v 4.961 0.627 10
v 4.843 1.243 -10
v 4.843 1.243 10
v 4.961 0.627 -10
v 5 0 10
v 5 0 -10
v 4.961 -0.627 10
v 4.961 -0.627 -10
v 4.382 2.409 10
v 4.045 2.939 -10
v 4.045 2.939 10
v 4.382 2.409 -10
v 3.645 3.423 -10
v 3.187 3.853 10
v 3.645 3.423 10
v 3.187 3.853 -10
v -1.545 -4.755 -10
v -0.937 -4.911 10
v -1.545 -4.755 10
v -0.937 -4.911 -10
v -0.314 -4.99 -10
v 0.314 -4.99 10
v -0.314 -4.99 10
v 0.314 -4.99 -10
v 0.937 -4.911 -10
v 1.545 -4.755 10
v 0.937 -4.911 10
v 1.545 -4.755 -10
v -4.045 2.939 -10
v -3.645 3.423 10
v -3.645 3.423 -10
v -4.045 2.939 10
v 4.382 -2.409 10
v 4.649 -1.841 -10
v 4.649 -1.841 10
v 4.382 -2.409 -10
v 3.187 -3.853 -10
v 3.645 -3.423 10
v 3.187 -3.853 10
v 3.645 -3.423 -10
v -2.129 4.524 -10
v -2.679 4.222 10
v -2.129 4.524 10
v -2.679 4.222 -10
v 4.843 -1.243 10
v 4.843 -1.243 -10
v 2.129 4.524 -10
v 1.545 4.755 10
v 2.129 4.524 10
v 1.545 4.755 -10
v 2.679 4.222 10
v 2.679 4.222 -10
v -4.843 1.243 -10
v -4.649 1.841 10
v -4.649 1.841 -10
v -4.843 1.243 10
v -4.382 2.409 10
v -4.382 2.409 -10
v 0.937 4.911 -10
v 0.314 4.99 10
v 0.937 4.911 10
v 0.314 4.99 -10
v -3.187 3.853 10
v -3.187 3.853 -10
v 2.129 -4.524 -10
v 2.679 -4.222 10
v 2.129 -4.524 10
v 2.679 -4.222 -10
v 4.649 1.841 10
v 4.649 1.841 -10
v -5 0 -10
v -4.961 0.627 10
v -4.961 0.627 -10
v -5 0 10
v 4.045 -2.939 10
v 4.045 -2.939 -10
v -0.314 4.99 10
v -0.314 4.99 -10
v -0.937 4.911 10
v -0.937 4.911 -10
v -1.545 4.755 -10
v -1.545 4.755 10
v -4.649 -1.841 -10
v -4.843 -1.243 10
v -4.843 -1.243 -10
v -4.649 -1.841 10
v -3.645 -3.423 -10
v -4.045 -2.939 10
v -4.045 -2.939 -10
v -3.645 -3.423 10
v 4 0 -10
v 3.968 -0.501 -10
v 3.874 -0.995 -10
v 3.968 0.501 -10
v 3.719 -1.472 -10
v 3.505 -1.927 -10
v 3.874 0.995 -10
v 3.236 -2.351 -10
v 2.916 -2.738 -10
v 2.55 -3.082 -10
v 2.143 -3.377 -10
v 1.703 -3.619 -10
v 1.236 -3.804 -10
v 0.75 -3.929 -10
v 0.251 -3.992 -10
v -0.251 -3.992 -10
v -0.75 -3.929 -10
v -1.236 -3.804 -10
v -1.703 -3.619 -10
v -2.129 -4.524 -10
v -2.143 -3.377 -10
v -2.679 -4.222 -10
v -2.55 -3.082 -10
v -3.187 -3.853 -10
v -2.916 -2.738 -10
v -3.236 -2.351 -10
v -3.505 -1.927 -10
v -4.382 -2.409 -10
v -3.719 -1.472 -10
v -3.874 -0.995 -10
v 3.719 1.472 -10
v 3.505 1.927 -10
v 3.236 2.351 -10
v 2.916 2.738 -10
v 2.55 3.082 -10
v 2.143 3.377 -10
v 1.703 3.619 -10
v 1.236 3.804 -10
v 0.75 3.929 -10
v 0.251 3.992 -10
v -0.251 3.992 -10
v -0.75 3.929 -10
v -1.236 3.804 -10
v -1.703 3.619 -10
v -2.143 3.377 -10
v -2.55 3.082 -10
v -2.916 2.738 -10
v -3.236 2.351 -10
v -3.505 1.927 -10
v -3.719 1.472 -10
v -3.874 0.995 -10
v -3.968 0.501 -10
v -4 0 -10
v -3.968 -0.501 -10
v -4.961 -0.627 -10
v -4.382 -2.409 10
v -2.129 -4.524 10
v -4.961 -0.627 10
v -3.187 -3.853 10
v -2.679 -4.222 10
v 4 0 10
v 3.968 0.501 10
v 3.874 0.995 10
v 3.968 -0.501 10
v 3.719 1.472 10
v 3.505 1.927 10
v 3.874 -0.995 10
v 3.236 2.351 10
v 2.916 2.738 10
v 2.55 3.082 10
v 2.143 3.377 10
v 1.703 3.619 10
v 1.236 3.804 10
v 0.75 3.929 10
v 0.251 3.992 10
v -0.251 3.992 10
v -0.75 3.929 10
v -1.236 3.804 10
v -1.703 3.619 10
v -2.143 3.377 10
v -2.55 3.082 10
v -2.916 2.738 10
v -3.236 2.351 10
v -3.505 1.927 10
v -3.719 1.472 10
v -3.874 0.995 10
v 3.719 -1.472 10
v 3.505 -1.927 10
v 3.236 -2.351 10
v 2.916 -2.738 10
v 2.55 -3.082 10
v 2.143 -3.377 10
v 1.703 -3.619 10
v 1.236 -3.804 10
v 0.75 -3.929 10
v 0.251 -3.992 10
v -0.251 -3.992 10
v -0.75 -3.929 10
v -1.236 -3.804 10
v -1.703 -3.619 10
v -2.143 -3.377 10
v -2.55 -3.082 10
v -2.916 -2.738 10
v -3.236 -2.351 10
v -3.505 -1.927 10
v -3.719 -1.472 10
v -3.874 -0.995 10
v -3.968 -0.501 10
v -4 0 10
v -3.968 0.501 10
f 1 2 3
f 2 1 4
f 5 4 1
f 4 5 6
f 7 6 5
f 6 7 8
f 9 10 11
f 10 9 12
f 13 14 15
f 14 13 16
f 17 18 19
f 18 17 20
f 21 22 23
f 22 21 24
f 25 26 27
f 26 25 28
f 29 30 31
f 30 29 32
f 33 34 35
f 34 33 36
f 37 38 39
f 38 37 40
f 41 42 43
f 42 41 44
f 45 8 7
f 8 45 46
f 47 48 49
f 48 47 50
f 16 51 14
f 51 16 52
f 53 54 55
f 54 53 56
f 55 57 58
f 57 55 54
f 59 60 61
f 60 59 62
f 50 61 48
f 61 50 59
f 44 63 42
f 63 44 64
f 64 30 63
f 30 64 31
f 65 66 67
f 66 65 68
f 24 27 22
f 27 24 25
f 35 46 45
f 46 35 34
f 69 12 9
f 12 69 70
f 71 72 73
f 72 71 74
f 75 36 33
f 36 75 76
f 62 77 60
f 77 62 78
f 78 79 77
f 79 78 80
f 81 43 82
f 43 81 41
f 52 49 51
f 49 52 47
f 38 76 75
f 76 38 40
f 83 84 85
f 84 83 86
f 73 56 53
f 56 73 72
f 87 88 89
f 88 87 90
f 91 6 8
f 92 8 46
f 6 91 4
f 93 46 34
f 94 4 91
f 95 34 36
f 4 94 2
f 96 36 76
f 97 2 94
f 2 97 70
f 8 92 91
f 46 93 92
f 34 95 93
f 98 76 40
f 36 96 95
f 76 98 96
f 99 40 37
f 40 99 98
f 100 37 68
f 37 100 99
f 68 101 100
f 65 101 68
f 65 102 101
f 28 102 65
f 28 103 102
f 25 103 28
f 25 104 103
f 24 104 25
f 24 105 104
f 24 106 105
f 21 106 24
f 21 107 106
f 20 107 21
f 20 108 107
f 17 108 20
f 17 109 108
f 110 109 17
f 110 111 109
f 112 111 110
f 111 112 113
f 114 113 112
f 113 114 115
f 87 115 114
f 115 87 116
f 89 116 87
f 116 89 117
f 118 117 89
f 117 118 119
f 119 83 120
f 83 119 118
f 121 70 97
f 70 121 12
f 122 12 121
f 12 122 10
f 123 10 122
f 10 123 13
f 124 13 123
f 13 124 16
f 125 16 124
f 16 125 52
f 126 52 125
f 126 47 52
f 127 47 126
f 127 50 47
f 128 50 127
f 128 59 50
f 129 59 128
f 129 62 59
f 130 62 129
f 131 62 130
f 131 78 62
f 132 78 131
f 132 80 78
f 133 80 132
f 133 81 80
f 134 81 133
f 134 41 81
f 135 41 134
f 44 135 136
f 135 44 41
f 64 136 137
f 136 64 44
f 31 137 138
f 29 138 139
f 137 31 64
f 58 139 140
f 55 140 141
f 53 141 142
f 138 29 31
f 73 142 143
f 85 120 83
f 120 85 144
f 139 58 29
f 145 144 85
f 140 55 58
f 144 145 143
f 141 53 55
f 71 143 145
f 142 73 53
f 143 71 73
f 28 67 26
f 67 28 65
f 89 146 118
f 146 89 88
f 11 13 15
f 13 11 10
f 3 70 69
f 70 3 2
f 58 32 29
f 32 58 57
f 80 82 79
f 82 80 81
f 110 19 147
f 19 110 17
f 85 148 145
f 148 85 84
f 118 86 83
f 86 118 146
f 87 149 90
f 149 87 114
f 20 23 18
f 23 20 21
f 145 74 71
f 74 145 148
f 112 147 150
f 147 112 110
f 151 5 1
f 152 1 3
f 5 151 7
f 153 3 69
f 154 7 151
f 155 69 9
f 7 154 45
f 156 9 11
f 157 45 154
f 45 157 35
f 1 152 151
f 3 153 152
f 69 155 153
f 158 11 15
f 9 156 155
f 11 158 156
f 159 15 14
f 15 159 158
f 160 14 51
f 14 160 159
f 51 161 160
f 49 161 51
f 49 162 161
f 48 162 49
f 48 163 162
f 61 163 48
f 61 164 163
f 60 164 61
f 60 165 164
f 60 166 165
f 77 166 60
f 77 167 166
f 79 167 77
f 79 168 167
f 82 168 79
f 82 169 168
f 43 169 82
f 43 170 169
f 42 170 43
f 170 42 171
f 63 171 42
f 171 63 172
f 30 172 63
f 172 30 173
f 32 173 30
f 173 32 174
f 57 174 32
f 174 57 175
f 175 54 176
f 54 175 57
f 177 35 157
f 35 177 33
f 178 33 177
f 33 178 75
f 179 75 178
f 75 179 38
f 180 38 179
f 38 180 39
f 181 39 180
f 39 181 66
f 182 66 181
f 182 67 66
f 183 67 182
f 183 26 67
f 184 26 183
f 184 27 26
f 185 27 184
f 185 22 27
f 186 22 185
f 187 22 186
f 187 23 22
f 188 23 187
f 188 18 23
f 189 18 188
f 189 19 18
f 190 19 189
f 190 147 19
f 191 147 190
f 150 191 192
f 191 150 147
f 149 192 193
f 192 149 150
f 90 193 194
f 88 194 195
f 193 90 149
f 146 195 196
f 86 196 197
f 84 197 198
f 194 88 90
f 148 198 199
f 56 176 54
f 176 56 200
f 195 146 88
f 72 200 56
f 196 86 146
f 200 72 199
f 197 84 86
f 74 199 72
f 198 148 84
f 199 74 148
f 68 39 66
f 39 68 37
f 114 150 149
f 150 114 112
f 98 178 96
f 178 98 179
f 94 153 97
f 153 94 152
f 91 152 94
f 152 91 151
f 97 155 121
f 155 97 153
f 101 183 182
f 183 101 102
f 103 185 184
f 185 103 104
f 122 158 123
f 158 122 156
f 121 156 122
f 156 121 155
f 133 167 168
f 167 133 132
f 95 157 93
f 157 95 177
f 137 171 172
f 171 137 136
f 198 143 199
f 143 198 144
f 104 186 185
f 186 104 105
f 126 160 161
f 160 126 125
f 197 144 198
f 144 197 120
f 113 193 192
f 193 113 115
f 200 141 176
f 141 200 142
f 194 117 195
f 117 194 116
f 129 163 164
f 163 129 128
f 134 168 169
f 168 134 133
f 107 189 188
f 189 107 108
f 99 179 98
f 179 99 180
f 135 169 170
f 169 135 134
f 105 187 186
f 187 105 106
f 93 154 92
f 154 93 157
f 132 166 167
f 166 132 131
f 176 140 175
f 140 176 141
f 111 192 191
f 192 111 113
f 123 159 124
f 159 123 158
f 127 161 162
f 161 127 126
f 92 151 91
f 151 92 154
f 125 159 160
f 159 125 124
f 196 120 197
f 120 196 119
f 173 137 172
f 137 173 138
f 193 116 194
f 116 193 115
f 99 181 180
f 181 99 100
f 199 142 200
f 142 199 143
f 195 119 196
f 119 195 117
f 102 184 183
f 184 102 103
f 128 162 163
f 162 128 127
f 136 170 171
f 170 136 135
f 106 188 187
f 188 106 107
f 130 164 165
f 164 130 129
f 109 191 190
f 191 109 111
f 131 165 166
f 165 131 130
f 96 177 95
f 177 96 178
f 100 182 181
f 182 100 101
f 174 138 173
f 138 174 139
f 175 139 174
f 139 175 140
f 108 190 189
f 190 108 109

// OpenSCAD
$fn = 50;


difference() {
	union() {
		translate(v = [0, 0, -10.0000000000]) {
			cylinder(h = 20, r = 5.0000000000);
		}
	}
	union() {
		translate(v = [0, 0, -100.0000000000]) {
			cylinder(h = 200, r = 4.0000000000);
		}
	}
}
